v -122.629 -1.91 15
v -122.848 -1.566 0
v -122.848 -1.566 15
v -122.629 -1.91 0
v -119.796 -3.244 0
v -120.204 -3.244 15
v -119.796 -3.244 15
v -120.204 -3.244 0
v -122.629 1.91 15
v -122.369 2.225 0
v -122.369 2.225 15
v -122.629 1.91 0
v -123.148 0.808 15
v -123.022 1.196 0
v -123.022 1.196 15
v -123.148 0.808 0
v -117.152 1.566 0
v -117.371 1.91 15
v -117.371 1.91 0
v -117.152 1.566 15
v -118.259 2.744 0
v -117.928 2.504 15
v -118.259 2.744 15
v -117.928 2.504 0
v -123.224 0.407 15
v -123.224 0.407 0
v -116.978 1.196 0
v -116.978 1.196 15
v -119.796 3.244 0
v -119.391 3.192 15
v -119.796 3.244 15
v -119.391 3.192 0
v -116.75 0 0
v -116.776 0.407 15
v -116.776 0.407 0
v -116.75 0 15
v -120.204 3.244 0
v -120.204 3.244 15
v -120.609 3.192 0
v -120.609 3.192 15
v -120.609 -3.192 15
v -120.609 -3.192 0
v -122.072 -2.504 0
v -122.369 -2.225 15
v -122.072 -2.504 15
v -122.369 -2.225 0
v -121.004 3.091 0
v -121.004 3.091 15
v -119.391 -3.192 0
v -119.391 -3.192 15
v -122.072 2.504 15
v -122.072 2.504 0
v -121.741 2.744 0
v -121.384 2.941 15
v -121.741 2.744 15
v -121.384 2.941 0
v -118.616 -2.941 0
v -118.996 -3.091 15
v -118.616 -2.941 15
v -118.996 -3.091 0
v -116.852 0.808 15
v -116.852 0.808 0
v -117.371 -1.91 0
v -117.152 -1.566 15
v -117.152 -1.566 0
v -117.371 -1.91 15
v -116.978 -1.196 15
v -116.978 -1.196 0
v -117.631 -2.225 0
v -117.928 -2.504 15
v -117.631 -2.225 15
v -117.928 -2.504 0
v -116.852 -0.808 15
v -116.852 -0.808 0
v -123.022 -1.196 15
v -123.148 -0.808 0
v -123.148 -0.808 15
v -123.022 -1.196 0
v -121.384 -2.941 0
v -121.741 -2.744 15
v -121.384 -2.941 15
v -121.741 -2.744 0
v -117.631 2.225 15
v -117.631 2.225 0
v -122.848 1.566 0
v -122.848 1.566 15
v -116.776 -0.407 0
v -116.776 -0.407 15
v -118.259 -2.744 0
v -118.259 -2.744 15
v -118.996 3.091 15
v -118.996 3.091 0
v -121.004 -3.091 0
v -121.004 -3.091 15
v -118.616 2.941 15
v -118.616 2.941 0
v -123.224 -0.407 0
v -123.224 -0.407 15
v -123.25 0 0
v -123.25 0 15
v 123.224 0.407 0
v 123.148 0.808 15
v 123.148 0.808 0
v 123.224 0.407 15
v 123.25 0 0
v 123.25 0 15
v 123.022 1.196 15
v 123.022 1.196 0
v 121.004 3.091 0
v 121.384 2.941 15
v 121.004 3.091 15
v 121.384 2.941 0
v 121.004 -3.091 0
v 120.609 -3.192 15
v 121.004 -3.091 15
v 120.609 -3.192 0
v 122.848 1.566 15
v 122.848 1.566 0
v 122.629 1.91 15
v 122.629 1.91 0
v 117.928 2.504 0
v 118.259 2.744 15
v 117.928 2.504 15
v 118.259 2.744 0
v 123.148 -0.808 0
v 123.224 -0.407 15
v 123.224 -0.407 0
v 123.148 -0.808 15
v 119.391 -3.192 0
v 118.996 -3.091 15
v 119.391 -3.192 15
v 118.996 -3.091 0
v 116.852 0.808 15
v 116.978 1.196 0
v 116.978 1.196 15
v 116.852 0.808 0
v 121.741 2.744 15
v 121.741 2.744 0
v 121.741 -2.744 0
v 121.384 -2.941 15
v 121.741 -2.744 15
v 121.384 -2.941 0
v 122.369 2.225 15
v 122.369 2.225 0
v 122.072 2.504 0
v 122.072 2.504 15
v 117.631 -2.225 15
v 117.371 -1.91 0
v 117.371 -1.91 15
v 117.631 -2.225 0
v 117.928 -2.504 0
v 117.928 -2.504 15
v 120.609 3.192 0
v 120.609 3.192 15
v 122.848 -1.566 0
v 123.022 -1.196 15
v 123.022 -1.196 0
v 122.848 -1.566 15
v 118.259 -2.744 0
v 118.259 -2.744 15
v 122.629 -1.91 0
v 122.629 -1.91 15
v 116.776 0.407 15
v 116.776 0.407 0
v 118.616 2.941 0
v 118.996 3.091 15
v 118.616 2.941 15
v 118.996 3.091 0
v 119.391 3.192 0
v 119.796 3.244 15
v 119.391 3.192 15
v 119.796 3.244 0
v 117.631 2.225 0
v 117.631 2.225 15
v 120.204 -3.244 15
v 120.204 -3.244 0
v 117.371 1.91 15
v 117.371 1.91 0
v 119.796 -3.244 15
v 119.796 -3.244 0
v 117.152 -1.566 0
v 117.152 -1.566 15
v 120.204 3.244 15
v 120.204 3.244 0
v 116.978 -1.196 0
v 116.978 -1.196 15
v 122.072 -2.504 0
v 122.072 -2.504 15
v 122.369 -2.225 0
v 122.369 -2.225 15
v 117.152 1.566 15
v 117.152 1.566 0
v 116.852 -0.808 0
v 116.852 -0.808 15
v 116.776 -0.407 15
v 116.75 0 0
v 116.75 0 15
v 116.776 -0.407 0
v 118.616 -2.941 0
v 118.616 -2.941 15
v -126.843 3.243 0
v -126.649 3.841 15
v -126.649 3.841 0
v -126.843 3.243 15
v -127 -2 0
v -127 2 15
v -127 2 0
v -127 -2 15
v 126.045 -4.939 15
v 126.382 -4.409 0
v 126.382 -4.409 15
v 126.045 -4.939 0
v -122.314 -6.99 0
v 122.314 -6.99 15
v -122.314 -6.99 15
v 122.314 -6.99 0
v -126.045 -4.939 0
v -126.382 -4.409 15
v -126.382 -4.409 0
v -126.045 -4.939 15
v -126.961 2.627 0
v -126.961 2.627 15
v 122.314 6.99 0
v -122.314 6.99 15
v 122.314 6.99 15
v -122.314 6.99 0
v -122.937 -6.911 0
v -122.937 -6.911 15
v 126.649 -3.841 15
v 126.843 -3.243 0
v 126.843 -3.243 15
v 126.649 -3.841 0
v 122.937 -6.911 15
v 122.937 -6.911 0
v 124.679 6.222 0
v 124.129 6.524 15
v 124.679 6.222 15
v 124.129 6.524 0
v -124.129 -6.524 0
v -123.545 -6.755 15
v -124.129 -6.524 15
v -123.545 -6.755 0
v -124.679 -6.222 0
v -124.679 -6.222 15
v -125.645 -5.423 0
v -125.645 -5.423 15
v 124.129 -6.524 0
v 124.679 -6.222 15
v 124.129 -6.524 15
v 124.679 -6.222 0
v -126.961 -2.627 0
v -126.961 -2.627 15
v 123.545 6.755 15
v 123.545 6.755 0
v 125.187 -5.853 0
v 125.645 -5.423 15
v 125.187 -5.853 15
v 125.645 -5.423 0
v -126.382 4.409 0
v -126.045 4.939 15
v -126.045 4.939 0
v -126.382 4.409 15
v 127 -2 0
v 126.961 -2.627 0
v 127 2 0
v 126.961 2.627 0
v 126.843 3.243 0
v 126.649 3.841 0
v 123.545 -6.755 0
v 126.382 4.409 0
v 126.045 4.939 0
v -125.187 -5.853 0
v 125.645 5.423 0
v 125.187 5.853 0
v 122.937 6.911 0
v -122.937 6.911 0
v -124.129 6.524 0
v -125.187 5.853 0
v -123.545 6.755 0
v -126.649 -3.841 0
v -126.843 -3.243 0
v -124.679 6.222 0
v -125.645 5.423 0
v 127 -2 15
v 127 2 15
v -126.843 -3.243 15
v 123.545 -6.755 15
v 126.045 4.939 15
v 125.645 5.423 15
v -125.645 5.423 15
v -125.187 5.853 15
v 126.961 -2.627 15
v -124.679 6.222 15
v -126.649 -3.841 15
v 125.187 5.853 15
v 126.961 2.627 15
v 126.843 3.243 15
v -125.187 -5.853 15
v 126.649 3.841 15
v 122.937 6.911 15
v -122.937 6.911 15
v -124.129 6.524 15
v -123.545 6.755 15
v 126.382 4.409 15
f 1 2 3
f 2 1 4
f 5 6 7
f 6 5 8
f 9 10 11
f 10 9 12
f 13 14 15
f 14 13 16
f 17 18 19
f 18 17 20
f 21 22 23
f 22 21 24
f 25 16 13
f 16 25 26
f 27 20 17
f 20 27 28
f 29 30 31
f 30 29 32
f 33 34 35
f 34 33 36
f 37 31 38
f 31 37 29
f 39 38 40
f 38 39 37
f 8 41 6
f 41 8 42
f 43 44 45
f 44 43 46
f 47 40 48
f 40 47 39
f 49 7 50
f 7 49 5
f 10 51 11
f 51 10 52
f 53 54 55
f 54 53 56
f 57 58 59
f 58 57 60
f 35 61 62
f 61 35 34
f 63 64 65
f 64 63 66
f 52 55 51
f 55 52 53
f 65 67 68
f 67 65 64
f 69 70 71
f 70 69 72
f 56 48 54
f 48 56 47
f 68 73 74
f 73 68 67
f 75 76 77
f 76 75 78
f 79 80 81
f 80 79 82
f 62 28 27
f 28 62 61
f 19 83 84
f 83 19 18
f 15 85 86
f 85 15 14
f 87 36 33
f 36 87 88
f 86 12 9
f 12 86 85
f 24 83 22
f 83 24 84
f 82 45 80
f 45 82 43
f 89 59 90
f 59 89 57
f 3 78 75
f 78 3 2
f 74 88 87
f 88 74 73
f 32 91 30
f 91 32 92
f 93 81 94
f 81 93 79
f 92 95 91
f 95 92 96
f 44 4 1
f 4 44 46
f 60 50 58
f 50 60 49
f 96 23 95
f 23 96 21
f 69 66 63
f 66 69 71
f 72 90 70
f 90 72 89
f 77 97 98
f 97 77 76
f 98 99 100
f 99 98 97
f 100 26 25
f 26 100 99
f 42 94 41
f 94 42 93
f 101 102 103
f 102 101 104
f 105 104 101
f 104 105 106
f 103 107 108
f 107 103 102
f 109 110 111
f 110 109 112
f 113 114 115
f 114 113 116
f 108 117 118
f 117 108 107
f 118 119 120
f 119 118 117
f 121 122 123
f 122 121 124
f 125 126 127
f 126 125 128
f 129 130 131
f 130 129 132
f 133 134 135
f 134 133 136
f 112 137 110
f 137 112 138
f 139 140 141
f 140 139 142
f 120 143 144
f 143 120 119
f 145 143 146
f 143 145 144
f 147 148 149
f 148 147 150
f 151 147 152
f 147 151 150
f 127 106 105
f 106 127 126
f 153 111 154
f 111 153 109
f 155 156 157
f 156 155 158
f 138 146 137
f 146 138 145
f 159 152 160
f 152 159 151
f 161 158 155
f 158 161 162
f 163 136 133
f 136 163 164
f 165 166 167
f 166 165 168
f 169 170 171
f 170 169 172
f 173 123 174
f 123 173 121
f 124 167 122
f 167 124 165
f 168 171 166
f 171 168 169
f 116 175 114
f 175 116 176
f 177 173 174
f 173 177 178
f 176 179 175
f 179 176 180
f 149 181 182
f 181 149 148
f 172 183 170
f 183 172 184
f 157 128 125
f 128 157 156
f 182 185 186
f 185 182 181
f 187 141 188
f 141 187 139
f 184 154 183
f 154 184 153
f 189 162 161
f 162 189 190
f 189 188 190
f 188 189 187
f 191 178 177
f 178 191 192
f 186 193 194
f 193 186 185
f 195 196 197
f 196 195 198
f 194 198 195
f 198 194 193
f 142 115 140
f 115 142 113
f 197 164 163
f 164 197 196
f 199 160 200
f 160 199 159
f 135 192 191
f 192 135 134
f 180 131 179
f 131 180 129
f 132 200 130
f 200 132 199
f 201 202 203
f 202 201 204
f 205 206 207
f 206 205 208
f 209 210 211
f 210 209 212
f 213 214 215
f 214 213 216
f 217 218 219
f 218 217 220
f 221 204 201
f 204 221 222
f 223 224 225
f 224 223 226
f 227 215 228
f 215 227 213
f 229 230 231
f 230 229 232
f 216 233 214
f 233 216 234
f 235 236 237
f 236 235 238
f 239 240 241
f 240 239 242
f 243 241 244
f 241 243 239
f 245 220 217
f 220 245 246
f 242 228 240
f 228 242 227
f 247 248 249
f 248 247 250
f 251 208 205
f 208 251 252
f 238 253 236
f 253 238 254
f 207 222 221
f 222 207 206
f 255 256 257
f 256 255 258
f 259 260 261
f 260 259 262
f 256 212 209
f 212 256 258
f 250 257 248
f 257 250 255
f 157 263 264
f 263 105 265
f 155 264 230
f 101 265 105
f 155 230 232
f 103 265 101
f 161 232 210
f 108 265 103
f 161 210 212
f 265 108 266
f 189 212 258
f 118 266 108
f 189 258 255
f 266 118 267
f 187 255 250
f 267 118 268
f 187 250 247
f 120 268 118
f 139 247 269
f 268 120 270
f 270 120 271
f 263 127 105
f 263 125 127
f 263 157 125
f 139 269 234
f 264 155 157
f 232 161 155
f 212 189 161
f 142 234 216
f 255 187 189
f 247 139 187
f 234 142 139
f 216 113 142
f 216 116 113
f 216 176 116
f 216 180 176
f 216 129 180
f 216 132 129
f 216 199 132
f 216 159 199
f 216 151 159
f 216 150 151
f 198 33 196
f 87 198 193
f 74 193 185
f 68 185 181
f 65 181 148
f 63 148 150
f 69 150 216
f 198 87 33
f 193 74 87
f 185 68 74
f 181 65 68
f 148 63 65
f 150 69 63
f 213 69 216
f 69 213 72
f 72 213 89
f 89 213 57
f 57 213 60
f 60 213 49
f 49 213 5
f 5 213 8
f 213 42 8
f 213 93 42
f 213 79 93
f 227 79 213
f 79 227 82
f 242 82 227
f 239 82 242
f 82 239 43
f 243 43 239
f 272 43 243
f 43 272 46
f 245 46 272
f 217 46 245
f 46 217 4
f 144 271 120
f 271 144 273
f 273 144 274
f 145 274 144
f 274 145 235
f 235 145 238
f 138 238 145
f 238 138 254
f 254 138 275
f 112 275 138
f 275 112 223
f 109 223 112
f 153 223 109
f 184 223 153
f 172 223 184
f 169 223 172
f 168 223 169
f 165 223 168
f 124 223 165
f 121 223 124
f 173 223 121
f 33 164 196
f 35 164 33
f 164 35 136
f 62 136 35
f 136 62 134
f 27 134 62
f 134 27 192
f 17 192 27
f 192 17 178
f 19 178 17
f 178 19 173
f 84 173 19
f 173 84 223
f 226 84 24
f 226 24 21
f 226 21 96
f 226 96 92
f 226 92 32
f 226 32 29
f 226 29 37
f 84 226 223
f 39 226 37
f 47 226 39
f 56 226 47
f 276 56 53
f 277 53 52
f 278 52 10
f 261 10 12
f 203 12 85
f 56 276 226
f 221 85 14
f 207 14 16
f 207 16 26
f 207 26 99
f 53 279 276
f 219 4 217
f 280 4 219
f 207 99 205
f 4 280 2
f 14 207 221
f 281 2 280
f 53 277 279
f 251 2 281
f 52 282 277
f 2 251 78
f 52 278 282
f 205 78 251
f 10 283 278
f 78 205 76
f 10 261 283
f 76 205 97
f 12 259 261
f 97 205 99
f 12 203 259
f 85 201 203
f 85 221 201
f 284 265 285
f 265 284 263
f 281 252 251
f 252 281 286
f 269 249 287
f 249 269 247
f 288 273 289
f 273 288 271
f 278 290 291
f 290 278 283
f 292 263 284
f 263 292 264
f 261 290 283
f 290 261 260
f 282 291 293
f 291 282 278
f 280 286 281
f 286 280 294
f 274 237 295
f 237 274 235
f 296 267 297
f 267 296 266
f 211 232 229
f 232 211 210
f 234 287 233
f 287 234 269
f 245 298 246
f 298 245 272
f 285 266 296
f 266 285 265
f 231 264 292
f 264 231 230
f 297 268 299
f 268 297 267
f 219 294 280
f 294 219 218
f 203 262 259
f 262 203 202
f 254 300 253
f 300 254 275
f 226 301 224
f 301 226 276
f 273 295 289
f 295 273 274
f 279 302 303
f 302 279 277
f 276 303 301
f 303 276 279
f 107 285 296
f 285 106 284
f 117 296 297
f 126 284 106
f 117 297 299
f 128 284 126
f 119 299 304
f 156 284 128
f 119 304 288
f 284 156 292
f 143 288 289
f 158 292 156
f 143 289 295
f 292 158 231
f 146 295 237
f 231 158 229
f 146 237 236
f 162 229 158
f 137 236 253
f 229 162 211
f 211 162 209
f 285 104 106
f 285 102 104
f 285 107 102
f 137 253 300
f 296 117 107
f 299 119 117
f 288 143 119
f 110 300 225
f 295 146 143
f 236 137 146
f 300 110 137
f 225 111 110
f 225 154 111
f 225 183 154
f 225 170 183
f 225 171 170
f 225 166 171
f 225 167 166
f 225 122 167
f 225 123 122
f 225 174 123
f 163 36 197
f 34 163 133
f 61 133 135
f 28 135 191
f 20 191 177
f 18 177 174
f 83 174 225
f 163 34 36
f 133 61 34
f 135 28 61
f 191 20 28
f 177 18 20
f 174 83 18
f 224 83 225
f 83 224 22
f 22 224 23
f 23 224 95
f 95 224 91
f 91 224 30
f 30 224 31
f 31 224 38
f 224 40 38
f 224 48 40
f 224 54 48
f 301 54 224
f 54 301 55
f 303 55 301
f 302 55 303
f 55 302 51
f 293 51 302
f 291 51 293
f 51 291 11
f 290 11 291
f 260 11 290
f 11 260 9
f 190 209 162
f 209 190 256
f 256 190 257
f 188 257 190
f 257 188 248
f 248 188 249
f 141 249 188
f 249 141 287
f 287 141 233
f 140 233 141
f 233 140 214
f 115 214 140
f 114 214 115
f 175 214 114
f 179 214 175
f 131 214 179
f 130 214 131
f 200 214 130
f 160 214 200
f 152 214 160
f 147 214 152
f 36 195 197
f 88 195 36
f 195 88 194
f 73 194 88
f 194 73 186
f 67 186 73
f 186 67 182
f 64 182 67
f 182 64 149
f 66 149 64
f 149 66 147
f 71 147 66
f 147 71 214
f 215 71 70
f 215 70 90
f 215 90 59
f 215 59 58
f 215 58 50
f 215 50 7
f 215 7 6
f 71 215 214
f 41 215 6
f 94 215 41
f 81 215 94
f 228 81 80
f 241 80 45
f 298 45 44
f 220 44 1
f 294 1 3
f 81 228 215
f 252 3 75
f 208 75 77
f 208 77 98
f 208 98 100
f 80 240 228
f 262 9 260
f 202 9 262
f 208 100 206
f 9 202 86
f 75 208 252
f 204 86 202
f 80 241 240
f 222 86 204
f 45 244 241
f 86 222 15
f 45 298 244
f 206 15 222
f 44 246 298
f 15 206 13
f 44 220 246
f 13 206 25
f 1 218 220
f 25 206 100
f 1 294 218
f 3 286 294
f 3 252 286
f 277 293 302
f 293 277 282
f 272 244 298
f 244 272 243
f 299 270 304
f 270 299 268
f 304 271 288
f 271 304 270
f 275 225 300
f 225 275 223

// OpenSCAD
$fn = 50;


difference() {
	union() {
		hull() {
			translate(v = [-122.0000000000, 2.0000000000, 0]) {
				cylinder(h = 15, r = 5);
			}
			translate(v = [122.0000000000, 2.0000000000, 0]) {
				cylinder(h = 15, r = 5);
			}
			translate(v = [-122.0000000000, -2.0000000000, 0]) {
				cylinder(h = 15, r = 5);
			}
			translate(v = [122.0000000000, -2.0000000000, 0]) {
				cylinder(h = 15, r = 5);
			}
		}
	}
	union() {
		translate(v = [-120.0000000000, 0.0000000000, -100.0000000000]) {
			cylinder(h = 200, r = 3.2500000000);
		}
		translate(v = [-120.0000000000, 0.0000000000, -100.0000000000]) {
			cylinder(h = 200, r = 3.2500000000);
		}
		translate(v = [120.0000000000, 0.0000000000, -100.0000000000]) {
			cylinder(h = 200, r = 3.2500000000);
		}
		translate(v = [120.0000000000, 0.0000000000, -100.0000000000]) {
			cylinder(h = 200, r = 3.2500000000);
		}
	}
}
